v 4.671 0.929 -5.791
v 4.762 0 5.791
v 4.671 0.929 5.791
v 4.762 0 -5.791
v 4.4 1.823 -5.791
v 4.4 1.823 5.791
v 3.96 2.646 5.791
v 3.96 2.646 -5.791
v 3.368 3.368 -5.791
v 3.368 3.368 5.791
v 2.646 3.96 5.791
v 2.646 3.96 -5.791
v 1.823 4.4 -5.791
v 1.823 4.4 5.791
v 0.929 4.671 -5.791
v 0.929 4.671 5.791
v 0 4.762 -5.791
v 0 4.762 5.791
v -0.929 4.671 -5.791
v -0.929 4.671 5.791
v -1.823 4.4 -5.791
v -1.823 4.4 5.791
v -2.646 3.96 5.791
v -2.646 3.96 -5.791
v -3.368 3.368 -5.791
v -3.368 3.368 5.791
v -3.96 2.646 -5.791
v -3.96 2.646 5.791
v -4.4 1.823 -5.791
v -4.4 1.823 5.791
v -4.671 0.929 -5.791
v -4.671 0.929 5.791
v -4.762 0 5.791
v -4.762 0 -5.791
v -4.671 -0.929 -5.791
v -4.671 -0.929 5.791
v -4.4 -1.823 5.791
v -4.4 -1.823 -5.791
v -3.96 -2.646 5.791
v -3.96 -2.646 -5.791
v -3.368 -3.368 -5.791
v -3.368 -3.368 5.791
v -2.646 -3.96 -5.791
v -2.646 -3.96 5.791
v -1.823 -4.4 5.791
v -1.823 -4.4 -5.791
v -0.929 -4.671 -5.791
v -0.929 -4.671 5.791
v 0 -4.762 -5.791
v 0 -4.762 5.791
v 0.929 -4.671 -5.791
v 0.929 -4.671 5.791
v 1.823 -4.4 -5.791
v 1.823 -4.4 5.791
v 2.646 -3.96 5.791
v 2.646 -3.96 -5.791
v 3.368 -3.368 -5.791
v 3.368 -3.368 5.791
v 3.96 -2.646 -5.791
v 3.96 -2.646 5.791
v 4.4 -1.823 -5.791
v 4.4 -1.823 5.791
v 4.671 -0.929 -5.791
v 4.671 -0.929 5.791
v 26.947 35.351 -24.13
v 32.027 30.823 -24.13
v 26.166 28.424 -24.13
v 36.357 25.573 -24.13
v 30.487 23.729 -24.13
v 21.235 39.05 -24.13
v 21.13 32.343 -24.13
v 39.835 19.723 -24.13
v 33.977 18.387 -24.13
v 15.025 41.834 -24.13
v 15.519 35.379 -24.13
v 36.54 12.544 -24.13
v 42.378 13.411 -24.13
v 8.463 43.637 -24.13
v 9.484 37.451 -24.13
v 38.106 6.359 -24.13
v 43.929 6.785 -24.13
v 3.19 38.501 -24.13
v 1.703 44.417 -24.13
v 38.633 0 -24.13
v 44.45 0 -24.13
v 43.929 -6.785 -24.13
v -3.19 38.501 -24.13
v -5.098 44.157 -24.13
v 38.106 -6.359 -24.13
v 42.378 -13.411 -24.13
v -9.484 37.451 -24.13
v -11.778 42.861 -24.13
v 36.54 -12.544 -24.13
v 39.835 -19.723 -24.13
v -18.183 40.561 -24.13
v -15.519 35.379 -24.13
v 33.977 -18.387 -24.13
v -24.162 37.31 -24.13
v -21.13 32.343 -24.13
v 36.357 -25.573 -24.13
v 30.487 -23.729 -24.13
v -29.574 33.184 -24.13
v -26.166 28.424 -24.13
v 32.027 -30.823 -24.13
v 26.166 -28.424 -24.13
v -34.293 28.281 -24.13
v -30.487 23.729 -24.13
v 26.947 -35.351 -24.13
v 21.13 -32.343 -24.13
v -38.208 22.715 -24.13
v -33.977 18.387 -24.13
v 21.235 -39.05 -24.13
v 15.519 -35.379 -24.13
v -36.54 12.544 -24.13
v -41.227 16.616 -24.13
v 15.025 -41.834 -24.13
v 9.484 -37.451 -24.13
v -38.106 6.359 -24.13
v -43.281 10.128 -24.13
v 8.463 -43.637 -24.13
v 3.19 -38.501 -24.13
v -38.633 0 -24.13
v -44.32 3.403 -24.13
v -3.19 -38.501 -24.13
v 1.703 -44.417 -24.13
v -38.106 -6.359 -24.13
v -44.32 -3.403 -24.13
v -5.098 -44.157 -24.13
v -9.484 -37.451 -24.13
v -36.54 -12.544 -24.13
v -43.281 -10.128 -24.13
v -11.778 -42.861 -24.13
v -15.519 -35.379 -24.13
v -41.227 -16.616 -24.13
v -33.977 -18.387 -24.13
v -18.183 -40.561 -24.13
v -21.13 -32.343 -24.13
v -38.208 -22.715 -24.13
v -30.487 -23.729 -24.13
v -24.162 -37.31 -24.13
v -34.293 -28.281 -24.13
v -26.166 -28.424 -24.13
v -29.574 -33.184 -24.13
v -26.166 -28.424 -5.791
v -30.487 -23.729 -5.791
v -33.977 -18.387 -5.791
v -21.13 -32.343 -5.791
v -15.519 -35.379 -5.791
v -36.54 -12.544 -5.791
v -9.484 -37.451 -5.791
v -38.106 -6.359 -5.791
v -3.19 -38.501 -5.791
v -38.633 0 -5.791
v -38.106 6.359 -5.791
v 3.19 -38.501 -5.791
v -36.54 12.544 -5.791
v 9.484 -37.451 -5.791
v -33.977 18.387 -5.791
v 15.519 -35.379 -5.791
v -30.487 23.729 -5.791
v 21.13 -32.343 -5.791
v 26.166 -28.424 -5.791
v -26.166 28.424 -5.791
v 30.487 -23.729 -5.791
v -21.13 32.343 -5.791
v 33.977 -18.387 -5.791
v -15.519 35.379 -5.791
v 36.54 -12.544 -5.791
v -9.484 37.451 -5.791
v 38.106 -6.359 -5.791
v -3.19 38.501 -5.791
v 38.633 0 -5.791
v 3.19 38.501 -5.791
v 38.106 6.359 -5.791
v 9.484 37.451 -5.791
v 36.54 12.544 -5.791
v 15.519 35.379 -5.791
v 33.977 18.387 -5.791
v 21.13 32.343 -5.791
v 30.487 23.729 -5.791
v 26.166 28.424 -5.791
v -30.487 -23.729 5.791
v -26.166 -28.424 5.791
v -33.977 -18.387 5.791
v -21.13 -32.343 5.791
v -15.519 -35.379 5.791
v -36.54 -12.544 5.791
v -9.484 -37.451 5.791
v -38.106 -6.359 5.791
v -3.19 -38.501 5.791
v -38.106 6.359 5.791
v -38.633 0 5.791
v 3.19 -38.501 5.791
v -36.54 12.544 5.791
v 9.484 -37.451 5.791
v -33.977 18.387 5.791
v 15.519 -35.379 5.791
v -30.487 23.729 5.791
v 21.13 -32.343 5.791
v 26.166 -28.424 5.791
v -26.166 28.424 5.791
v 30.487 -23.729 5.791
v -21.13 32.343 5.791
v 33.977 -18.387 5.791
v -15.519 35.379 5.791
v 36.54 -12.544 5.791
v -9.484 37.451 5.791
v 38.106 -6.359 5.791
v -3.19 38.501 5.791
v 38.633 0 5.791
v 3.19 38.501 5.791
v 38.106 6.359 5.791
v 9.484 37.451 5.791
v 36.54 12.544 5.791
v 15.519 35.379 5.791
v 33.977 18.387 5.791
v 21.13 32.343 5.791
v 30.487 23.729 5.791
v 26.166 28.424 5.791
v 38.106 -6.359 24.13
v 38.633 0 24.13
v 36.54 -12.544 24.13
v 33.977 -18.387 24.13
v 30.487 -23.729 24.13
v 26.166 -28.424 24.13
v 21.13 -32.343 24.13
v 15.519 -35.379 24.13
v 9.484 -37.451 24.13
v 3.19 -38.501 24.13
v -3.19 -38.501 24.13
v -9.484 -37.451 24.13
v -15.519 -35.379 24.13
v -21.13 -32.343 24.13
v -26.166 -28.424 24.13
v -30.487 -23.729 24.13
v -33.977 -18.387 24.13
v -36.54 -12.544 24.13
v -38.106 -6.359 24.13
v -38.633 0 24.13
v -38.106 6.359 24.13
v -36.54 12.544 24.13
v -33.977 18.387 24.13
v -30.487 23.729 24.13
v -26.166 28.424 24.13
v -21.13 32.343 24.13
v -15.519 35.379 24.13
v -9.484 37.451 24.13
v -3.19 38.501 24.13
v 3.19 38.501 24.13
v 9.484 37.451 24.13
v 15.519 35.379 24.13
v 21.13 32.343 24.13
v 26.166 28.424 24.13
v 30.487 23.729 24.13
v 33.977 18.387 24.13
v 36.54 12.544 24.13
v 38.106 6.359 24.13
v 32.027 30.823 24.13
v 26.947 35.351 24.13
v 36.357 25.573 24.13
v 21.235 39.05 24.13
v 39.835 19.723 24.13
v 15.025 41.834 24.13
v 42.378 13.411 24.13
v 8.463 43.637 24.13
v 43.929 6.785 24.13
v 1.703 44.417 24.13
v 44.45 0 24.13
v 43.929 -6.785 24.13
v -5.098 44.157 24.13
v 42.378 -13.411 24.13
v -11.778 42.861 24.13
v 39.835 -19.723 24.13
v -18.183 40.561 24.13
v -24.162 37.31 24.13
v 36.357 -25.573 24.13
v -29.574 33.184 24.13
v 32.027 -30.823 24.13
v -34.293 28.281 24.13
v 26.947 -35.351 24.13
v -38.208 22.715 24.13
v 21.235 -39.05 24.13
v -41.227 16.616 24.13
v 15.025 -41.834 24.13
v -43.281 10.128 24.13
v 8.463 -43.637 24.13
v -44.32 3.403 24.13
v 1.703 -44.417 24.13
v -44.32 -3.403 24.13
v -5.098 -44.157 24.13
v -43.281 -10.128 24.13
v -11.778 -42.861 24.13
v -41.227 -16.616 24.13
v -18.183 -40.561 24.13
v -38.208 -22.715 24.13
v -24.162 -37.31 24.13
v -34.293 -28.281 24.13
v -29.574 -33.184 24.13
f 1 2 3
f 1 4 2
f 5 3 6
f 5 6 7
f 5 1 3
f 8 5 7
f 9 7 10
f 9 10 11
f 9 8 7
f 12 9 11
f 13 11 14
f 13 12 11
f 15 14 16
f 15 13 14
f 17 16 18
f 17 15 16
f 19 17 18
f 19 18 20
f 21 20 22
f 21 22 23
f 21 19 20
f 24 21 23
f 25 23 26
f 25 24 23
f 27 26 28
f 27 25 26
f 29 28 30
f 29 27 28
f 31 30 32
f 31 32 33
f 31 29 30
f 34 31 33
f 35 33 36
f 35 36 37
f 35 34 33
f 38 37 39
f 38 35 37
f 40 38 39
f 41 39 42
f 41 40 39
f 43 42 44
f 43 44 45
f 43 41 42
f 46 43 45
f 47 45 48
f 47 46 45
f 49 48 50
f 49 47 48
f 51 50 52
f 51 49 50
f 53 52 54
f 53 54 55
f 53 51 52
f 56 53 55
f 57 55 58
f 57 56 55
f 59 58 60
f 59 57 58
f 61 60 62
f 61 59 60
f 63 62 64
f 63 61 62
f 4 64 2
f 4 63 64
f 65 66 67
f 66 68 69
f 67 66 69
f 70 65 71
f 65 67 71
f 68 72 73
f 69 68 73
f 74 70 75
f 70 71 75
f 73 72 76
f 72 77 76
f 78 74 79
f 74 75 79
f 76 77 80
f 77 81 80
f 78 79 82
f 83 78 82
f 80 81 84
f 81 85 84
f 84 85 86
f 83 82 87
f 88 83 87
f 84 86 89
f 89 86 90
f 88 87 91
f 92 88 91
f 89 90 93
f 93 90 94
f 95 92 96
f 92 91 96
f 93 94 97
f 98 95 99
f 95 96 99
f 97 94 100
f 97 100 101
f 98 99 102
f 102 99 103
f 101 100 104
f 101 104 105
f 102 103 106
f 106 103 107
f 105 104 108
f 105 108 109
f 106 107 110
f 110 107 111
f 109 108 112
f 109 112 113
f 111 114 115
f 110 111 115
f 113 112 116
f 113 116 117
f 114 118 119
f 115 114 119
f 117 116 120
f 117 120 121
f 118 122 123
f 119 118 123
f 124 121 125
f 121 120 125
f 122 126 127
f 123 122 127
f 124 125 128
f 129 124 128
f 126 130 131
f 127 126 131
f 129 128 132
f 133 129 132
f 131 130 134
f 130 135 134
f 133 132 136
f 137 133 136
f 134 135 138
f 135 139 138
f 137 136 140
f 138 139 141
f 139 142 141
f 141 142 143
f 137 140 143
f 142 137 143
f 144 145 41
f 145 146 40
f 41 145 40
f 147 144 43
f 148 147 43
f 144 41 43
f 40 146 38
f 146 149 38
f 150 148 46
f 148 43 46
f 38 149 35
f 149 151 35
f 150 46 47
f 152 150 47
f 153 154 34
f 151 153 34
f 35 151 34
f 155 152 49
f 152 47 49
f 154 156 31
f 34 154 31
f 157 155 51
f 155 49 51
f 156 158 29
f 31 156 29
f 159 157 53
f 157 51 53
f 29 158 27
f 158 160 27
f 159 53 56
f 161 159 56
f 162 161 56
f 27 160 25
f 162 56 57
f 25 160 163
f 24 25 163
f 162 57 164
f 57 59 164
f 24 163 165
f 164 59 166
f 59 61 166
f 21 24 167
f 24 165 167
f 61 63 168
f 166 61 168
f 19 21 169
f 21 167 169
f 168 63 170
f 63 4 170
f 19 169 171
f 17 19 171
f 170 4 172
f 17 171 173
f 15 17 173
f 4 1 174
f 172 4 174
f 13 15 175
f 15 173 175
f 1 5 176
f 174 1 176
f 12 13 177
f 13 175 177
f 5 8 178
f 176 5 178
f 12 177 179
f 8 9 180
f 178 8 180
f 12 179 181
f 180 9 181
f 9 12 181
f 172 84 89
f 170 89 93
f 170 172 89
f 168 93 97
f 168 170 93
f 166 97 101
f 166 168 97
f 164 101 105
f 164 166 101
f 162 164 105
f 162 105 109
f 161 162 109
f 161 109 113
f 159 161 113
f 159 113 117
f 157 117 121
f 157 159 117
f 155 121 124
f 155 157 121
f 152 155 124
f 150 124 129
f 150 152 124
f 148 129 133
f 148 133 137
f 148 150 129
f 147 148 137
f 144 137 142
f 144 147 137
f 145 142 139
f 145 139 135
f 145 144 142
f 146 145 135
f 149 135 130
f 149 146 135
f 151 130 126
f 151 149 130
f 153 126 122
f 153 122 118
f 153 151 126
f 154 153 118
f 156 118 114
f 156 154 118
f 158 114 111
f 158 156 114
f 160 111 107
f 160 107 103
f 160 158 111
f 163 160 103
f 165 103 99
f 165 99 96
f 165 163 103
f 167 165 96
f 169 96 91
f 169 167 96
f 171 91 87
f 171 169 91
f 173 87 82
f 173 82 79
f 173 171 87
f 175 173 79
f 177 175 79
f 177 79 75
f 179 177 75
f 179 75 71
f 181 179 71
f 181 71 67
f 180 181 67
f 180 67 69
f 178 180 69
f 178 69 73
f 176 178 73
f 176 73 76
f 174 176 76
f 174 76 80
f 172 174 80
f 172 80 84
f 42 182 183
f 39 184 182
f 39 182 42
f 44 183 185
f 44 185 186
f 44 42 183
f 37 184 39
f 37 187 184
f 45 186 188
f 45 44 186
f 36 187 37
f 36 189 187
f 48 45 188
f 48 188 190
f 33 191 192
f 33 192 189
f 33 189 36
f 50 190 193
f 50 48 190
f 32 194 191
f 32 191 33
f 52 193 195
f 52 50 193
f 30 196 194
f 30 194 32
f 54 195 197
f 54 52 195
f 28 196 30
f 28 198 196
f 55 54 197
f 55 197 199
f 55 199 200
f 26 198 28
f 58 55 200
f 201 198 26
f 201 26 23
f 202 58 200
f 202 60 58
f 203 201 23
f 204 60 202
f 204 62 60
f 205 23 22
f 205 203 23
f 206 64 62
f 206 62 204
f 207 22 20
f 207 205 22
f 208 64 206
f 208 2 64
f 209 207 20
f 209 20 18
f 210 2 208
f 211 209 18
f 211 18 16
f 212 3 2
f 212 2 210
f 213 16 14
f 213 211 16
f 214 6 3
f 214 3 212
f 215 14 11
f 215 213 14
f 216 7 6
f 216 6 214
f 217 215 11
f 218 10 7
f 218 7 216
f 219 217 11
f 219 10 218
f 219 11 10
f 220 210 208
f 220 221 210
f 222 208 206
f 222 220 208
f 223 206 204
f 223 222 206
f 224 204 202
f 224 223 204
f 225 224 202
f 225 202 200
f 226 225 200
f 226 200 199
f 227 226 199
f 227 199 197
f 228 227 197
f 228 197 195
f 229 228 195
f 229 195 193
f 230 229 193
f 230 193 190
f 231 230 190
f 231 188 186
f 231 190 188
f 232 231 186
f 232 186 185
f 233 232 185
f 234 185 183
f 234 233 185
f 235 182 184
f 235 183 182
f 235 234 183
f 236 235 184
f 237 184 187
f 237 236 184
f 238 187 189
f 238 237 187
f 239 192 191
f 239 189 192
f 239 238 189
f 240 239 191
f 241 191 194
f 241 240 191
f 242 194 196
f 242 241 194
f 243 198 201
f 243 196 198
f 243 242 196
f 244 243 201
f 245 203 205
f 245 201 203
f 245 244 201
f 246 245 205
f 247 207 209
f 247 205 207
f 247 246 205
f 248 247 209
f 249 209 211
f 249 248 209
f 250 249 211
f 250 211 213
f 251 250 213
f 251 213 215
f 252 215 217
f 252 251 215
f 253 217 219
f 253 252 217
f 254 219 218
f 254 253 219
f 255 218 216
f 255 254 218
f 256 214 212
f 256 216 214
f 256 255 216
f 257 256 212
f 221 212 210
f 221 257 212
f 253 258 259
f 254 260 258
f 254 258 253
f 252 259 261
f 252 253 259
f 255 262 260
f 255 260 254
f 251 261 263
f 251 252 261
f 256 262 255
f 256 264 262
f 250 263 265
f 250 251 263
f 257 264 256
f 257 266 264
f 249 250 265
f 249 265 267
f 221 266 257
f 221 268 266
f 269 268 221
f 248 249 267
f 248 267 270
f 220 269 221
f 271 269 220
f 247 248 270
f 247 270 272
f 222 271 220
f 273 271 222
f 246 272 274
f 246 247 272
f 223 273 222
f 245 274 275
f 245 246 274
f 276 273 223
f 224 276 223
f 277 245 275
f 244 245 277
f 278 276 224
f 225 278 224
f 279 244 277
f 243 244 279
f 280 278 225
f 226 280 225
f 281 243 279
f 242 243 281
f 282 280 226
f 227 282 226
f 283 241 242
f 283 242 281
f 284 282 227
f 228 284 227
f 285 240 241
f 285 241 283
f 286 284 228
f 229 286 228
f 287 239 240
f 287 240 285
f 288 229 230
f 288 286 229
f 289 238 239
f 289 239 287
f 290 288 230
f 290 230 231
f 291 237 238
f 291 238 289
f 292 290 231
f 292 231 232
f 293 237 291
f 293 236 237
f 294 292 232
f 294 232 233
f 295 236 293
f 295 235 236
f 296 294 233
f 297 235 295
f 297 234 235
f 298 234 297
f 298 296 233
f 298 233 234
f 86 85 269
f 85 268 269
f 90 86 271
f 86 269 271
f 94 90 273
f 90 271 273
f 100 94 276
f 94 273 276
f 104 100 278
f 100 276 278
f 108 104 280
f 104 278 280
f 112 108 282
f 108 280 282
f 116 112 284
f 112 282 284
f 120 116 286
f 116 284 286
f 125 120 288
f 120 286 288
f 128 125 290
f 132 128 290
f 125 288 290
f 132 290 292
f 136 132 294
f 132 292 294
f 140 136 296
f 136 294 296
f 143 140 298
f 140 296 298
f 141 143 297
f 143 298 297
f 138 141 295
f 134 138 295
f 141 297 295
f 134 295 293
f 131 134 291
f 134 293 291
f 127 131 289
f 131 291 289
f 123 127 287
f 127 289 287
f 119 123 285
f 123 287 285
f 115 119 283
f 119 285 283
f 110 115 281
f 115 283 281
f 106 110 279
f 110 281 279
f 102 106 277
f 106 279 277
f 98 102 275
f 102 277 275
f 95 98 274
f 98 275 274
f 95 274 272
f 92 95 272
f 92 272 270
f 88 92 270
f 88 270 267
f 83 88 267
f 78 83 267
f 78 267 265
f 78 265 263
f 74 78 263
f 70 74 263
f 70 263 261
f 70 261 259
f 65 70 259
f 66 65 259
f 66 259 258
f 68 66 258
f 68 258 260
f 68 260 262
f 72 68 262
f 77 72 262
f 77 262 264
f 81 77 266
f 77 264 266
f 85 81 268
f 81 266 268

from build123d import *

# Parameters (mm, degrees)
F0_W     = 5.8166
F0_H     = 48.26
F2_R     = 38.6334
F2_R_2   = 4.7625
F3_DEPTH = 5.7912


with BuildPart() as f1:
    # F0 (on Front) → F1 (revolve)
    with BuildSketch(Plane.XZ):
        with Locations((41.5417, 0)):
            Rectangle(F0_W, F0_H)
    revolve(axis=Axis((0, 0, 0), (0, 0, -1)))

    # F2 (on Top) → F3 (join, symmetric)
    with BuildSketch(Plane.XY):
        Circle(F2_R)
        Circle(F2_R_2, mode=Mode.SUBTRACT)
    extrude(amount=F3_DEPTH, both=True)


solid = f1.part
